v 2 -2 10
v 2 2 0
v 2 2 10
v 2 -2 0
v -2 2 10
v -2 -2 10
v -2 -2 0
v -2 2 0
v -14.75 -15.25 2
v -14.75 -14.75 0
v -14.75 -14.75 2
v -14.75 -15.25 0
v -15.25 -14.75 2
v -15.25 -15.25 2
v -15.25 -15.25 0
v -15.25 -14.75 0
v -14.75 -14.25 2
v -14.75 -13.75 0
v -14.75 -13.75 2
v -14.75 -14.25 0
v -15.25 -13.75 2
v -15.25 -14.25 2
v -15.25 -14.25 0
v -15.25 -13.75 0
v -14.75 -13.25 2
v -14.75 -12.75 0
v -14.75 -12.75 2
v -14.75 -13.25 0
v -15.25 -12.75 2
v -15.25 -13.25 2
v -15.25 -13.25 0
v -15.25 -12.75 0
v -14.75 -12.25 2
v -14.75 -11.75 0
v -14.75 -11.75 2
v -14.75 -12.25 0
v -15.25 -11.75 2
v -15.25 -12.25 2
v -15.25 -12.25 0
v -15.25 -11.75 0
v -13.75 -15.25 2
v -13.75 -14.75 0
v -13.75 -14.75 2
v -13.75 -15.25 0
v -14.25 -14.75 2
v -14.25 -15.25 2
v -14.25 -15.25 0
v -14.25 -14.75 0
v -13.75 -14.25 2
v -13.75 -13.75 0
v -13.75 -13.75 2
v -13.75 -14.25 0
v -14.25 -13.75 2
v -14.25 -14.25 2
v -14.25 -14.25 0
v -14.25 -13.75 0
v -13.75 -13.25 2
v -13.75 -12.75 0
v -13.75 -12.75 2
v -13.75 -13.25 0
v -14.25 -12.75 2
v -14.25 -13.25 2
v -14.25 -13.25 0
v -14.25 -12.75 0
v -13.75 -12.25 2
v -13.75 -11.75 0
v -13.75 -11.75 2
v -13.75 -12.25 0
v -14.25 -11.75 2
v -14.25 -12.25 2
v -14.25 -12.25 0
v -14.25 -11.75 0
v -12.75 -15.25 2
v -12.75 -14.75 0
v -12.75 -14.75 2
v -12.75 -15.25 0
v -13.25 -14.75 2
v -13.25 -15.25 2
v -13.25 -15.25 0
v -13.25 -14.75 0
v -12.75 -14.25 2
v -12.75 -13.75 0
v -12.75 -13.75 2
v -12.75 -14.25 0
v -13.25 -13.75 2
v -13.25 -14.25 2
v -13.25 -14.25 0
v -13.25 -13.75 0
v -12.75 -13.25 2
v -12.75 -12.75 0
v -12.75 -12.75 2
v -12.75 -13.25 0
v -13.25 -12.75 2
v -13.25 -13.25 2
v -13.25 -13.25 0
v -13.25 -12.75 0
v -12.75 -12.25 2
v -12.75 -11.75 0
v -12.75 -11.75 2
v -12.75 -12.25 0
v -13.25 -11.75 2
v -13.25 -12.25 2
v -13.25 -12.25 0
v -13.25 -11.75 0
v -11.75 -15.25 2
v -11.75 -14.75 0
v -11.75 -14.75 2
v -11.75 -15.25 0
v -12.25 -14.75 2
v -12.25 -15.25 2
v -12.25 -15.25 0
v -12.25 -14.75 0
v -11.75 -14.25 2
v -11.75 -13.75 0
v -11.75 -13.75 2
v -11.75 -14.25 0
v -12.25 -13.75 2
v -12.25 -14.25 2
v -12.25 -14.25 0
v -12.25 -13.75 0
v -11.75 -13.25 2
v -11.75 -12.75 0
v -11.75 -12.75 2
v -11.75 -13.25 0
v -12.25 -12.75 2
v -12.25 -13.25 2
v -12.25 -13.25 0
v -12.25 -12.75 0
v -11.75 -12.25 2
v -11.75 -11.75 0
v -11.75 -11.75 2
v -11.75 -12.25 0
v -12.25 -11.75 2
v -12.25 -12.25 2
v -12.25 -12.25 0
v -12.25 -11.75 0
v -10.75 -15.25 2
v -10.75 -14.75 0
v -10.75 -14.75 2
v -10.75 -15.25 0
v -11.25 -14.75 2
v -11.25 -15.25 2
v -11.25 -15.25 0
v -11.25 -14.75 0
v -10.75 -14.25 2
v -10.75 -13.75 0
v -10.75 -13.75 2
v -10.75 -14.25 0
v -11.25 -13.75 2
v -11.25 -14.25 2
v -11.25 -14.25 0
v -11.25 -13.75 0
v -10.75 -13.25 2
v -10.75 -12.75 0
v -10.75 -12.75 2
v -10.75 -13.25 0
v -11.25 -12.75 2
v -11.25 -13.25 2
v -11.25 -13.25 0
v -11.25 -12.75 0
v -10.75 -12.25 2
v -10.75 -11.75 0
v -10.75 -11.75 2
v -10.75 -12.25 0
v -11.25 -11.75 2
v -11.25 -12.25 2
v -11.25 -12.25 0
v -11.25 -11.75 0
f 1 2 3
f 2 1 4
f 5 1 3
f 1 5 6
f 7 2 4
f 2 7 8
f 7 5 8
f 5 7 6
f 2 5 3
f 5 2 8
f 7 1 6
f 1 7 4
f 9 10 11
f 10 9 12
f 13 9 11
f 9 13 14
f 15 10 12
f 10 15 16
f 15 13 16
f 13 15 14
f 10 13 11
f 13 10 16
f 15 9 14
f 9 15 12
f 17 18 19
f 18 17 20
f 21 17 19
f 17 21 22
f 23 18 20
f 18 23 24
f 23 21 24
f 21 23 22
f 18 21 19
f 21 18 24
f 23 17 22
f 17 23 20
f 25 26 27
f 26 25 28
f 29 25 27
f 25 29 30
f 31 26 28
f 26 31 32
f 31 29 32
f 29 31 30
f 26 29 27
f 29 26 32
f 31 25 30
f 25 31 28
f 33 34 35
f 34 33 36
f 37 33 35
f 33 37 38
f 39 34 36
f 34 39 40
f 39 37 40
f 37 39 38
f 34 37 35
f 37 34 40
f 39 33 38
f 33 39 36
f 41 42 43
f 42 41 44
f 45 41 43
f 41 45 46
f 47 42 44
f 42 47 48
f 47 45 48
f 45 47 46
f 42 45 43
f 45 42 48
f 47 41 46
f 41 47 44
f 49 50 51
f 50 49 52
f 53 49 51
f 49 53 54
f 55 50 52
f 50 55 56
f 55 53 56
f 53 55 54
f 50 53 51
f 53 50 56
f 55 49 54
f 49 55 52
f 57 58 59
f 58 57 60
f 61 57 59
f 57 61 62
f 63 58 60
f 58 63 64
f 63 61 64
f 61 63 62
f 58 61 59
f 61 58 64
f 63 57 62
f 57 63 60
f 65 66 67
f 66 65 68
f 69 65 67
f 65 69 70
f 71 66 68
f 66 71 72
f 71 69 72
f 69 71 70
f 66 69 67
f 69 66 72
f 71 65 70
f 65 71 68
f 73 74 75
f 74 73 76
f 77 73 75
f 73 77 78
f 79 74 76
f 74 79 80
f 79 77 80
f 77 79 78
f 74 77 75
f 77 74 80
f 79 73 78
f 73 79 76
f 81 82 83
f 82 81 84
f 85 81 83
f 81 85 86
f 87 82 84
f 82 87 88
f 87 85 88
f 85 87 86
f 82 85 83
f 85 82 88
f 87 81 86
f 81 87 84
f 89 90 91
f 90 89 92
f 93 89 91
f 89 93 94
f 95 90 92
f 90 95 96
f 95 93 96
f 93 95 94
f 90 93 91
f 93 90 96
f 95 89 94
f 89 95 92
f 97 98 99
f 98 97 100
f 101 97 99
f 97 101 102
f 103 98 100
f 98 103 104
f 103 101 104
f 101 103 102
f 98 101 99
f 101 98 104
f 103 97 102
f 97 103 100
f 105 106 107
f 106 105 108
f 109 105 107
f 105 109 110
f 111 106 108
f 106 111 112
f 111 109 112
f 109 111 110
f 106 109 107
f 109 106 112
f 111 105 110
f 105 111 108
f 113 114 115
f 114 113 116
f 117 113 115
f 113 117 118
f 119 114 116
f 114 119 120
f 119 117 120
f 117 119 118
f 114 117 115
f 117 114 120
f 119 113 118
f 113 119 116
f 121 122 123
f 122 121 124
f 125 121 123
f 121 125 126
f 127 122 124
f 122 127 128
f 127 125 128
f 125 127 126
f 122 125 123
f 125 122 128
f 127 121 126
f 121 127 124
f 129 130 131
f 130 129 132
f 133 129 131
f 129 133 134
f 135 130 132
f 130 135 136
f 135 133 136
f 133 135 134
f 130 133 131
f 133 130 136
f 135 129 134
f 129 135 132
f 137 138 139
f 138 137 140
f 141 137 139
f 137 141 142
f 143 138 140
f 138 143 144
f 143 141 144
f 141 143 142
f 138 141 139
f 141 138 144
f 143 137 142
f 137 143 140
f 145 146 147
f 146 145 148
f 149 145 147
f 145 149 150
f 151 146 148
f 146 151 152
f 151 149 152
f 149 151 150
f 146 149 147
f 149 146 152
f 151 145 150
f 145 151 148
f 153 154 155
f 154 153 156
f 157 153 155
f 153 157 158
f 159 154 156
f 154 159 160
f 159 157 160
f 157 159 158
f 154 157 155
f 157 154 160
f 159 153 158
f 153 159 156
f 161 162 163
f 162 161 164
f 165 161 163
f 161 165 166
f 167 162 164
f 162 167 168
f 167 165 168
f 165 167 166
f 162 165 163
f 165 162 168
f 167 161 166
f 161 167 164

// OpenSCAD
translate([0, 0, 5]) color([0,1,0,0.9]) cube([4, 4, 10], center=true);
translate([-15, -15, 1]) color([1,0,0]) cube([0.5, 0.5, 2], center=true);
translate([-15, -14, 1]) color([1,0,0]) cube([0.5, 0.5, 2], center=true);
translate([-15, -13, 1]) color([1,0,0]) cube([0.5, 0.5, 2], center=true);
translate([-15, -12, 1]) color([1,0,0]) cube([0.5, 0.5, 2], center=true);
translate([-14, -15, 1]) color([1,0,0]) cube([0.5, 0.5, 2], center=true);
translate([-14, -14, 1]) color([1,0,0]) cube([0.5, 0.5, 2], center=true);
translate([-14, -13, 1]) color([1,0,0]) cube([0.5, 0.5, 2], center=true);
translate([-14, -12, 1]) color([1,0,0]) cube([0.5, 0.5, 2], center=true);
translate([-13, -15, 1]) color([1,0,0]) cube([0.5, 0.5, 2], center=true);
translate([-13, -14, 1]) color([1,0,0]) cube([0.5, 0.5, 2], center=true);
translate([-13, -13, 1]) color([1,0,0]) cube([0.5, 0.5, 2], center=true);
translate([-13, -12, 1]) color([1,0,0]) cube([0.5, 0.5, 2], center=true);
translate([-12, -15, 1]) color([1,0,0]) cube([0.5, 0.5, 2], center=true);
translate([-12, -14, 1]) color([1,0,0]) cube([0.5, 0.5, 2], center=true);
translate([-12, -13, 1]) color([1,0,0]) cube([0.5, 0.5, 2], center=true);
translate([-12, -12, 1]) color([1,0,0]) cube([0.5, 0.5, 2], center=true);
translate([-11, -15, 1]) color([1,0,0]) cube([0.5, 0.5, 2], center=true);
translate([-11, -14, 1]) color([1,0,0]) cube([0.5, 0.5, 2], center=true);
translate([-11, -13, 1]) color([1,0,0]) cube([0.5, 0.5, 2], center=true);
translate([-11, -12, 1]) color([1,0,0]) cube([0.5, 0.5, 2], center=true);
